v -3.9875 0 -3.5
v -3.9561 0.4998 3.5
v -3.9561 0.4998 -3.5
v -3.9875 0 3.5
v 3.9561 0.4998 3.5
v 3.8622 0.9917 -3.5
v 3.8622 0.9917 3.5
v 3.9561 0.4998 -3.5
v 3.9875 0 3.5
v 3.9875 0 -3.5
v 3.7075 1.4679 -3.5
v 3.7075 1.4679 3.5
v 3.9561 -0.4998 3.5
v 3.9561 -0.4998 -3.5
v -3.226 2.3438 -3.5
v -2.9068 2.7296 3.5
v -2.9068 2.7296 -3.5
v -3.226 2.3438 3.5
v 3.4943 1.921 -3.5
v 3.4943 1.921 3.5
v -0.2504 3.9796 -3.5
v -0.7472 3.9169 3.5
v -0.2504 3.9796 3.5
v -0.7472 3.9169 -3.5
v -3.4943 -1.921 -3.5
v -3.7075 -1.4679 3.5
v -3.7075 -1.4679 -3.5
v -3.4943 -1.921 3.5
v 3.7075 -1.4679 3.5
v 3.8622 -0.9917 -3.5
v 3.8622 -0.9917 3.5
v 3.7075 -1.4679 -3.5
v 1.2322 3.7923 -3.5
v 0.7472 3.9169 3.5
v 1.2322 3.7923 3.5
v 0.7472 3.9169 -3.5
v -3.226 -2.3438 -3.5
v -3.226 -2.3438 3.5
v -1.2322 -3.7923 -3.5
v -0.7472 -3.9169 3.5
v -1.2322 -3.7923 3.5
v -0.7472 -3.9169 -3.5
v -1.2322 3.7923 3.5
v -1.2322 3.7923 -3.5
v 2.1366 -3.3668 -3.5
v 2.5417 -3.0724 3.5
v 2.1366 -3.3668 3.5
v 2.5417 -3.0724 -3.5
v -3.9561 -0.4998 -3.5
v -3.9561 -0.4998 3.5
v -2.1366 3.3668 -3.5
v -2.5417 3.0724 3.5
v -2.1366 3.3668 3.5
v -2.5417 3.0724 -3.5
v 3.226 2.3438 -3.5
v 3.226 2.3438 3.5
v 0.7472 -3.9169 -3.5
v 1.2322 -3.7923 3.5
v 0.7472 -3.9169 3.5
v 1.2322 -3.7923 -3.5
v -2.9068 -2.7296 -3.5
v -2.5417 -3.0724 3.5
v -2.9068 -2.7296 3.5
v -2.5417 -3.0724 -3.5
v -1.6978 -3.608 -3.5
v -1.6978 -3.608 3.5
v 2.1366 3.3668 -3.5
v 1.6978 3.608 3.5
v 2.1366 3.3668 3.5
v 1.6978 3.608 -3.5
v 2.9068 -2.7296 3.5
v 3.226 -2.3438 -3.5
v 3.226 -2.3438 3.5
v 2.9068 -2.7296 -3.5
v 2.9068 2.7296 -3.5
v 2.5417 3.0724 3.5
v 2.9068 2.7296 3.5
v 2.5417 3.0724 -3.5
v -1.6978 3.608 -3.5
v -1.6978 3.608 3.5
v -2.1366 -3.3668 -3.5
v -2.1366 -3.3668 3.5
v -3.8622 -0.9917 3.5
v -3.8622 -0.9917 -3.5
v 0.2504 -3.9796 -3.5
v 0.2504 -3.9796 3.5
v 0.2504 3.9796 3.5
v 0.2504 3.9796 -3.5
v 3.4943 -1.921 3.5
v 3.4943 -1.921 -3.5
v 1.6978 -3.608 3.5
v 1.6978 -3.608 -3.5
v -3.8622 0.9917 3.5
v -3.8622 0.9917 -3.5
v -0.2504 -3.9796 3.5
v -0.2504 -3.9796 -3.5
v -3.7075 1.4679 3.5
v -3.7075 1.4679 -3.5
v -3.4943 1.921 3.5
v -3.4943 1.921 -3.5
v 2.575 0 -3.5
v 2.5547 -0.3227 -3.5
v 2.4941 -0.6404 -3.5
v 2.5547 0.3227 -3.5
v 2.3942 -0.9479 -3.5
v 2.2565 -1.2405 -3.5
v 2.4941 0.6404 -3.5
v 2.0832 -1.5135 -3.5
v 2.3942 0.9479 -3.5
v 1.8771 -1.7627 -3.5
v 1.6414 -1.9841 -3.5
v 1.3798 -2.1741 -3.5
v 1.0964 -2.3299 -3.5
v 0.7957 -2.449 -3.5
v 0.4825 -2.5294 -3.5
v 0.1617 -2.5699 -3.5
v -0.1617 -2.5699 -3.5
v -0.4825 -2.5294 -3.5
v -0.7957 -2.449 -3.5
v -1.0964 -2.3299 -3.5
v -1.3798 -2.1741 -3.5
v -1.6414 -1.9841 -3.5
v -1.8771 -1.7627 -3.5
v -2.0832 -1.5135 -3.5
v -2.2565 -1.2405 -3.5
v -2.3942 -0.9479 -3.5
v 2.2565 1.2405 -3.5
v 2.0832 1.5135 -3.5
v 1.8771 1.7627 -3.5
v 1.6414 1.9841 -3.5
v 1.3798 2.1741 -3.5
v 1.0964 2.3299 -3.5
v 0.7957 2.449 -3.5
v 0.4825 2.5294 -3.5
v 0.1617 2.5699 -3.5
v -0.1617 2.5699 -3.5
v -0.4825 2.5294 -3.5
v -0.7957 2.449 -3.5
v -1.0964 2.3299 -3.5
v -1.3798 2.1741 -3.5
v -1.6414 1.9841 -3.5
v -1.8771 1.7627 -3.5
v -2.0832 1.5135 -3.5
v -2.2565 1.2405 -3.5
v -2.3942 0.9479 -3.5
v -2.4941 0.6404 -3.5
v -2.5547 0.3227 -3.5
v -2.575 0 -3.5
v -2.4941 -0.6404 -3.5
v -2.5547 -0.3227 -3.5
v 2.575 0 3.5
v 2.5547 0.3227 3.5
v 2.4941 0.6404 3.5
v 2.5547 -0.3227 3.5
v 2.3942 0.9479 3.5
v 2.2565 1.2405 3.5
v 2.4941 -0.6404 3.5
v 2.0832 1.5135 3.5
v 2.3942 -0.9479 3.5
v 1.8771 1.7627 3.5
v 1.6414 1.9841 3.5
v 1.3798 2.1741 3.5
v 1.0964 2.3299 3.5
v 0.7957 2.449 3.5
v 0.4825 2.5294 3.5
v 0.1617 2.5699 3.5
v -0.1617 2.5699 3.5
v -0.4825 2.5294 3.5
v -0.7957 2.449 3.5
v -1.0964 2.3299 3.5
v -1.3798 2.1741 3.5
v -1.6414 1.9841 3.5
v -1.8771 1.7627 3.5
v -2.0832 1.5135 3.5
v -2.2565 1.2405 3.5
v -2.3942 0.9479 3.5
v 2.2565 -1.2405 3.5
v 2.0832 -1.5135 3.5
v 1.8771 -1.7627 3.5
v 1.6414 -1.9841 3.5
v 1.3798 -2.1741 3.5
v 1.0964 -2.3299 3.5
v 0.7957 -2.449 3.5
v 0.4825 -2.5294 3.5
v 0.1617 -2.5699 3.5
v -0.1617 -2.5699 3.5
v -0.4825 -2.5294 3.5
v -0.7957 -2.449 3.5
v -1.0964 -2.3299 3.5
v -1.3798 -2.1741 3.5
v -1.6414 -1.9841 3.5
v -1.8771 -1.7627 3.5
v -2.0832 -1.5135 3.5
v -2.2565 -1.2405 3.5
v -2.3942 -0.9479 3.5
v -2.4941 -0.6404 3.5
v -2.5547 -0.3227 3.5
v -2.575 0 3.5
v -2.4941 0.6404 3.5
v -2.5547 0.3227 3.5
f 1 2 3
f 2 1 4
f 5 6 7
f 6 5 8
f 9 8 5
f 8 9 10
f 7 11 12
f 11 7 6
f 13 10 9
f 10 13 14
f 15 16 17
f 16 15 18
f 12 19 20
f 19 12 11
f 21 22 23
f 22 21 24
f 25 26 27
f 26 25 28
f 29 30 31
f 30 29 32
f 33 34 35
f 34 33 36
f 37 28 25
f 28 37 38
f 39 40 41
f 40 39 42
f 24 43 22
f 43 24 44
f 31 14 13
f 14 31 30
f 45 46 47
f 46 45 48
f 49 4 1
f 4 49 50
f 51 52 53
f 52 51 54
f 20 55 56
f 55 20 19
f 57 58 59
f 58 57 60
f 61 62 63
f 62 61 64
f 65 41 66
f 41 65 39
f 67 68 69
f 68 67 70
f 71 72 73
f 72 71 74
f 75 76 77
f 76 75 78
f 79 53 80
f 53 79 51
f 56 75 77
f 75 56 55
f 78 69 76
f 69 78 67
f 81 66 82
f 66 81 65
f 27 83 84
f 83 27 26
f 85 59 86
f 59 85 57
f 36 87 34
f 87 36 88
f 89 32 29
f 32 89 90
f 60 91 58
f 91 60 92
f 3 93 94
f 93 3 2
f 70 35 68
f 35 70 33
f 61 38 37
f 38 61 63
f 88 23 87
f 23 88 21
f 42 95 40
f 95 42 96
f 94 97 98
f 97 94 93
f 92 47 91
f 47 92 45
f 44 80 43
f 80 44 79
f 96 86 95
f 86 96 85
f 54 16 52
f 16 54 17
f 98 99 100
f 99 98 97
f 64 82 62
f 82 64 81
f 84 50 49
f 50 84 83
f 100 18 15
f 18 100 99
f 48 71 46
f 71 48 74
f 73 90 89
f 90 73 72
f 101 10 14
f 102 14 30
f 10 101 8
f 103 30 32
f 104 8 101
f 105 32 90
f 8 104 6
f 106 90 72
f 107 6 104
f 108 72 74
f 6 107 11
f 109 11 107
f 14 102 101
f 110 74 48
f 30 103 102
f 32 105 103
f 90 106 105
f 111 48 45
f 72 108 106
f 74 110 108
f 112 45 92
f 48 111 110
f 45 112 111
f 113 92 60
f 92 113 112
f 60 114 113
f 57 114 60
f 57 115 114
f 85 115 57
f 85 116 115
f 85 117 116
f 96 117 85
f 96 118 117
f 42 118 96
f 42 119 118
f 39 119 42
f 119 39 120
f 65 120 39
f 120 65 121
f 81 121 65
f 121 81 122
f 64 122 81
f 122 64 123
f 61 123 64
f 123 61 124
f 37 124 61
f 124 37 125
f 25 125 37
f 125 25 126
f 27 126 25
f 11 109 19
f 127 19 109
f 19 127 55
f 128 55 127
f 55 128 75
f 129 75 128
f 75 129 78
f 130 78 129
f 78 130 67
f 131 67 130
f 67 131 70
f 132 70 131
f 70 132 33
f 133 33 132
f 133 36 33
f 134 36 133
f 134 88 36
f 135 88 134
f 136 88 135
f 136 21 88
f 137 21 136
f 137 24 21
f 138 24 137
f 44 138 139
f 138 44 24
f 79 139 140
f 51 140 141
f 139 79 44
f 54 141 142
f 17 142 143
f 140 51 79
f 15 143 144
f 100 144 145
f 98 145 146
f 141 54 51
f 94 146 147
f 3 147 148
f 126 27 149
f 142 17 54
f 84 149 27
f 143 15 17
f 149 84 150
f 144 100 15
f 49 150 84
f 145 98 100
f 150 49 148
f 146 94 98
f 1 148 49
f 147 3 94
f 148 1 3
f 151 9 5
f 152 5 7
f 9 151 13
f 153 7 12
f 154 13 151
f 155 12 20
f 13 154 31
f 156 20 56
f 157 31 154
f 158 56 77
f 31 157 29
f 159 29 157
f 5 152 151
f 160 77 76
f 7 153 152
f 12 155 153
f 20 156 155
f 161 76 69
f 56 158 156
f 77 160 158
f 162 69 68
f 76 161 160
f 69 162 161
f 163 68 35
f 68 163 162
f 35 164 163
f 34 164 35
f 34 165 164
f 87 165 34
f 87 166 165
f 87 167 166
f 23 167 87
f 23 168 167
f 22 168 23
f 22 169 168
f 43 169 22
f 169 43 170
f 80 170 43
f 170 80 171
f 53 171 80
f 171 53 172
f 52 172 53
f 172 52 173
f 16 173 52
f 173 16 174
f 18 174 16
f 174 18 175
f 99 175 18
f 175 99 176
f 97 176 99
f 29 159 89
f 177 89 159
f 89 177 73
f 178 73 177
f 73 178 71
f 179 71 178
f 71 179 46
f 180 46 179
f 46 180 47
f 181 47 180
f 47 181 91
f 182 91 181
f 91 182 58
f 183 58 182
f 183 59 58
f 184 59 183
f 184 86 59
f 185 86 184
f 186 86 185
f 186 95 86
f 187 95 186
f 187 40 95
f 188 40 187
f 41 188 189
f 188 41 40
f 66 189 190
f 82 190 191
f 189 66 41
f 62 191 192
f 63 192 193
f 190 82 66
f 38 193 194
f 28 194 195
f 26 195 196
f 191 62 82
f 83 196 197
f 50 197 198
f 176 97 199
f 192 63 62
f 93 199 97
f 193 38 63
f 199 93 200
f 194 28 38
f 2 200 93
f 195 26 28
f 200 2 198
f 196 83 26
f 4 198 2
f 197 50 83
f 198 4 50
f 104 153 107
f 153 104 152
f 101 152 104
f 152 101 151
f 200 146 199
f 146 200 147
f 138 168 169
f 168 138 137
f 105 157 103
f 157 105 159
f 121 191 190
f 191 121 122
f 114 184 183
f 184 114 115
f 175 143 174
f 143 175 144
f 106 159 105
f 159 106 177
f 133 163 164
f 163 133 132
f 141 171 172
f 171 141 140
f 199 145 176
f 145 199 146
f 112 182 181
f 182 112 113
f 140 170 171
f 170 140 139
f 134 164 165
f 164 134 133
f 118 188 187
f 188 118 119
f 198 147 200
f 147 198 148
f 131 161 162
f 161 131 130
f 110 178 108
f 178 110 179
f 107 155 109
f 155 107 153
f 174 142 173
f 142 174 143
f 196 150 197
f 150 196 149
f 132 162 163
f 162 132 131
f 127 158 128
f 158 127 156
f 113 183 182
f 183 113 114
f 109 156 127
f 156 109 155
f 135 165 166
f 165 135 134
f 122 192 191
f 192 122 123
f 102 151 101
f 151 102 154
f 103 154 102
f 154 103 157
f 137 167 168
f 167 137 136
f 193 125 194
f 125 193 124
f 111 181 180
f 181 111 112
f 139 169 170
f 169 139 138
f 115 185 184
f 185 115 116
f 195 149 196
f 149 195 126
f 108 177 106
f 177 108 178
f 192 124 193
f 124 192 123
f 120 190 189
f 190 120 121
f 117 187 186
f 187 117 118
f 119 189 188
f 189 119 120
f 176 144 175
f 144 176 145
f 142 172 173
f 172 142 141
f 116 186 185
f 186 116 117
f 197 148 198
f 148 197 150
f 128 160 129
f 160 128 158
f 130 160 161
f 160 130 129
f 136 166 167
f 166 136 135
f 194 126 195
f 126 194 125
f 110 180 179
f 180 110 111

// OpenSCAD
//Bearing adapter

//outer diameter of adapter (inner diameter of bearing)
outer_diameter = 7.975;

//inner diameter of adapter
inner_diameter = 5.15;

//bearing width
bearing_width = 7;


/*[Hidden]*/

difference() {
    cylinder (d=outer_diameter,h=bearing_width,center=true,$fn=50);
    cylinder (d=inner_diameter,h=bearing_width+1,center=true,$fn=50);
}
